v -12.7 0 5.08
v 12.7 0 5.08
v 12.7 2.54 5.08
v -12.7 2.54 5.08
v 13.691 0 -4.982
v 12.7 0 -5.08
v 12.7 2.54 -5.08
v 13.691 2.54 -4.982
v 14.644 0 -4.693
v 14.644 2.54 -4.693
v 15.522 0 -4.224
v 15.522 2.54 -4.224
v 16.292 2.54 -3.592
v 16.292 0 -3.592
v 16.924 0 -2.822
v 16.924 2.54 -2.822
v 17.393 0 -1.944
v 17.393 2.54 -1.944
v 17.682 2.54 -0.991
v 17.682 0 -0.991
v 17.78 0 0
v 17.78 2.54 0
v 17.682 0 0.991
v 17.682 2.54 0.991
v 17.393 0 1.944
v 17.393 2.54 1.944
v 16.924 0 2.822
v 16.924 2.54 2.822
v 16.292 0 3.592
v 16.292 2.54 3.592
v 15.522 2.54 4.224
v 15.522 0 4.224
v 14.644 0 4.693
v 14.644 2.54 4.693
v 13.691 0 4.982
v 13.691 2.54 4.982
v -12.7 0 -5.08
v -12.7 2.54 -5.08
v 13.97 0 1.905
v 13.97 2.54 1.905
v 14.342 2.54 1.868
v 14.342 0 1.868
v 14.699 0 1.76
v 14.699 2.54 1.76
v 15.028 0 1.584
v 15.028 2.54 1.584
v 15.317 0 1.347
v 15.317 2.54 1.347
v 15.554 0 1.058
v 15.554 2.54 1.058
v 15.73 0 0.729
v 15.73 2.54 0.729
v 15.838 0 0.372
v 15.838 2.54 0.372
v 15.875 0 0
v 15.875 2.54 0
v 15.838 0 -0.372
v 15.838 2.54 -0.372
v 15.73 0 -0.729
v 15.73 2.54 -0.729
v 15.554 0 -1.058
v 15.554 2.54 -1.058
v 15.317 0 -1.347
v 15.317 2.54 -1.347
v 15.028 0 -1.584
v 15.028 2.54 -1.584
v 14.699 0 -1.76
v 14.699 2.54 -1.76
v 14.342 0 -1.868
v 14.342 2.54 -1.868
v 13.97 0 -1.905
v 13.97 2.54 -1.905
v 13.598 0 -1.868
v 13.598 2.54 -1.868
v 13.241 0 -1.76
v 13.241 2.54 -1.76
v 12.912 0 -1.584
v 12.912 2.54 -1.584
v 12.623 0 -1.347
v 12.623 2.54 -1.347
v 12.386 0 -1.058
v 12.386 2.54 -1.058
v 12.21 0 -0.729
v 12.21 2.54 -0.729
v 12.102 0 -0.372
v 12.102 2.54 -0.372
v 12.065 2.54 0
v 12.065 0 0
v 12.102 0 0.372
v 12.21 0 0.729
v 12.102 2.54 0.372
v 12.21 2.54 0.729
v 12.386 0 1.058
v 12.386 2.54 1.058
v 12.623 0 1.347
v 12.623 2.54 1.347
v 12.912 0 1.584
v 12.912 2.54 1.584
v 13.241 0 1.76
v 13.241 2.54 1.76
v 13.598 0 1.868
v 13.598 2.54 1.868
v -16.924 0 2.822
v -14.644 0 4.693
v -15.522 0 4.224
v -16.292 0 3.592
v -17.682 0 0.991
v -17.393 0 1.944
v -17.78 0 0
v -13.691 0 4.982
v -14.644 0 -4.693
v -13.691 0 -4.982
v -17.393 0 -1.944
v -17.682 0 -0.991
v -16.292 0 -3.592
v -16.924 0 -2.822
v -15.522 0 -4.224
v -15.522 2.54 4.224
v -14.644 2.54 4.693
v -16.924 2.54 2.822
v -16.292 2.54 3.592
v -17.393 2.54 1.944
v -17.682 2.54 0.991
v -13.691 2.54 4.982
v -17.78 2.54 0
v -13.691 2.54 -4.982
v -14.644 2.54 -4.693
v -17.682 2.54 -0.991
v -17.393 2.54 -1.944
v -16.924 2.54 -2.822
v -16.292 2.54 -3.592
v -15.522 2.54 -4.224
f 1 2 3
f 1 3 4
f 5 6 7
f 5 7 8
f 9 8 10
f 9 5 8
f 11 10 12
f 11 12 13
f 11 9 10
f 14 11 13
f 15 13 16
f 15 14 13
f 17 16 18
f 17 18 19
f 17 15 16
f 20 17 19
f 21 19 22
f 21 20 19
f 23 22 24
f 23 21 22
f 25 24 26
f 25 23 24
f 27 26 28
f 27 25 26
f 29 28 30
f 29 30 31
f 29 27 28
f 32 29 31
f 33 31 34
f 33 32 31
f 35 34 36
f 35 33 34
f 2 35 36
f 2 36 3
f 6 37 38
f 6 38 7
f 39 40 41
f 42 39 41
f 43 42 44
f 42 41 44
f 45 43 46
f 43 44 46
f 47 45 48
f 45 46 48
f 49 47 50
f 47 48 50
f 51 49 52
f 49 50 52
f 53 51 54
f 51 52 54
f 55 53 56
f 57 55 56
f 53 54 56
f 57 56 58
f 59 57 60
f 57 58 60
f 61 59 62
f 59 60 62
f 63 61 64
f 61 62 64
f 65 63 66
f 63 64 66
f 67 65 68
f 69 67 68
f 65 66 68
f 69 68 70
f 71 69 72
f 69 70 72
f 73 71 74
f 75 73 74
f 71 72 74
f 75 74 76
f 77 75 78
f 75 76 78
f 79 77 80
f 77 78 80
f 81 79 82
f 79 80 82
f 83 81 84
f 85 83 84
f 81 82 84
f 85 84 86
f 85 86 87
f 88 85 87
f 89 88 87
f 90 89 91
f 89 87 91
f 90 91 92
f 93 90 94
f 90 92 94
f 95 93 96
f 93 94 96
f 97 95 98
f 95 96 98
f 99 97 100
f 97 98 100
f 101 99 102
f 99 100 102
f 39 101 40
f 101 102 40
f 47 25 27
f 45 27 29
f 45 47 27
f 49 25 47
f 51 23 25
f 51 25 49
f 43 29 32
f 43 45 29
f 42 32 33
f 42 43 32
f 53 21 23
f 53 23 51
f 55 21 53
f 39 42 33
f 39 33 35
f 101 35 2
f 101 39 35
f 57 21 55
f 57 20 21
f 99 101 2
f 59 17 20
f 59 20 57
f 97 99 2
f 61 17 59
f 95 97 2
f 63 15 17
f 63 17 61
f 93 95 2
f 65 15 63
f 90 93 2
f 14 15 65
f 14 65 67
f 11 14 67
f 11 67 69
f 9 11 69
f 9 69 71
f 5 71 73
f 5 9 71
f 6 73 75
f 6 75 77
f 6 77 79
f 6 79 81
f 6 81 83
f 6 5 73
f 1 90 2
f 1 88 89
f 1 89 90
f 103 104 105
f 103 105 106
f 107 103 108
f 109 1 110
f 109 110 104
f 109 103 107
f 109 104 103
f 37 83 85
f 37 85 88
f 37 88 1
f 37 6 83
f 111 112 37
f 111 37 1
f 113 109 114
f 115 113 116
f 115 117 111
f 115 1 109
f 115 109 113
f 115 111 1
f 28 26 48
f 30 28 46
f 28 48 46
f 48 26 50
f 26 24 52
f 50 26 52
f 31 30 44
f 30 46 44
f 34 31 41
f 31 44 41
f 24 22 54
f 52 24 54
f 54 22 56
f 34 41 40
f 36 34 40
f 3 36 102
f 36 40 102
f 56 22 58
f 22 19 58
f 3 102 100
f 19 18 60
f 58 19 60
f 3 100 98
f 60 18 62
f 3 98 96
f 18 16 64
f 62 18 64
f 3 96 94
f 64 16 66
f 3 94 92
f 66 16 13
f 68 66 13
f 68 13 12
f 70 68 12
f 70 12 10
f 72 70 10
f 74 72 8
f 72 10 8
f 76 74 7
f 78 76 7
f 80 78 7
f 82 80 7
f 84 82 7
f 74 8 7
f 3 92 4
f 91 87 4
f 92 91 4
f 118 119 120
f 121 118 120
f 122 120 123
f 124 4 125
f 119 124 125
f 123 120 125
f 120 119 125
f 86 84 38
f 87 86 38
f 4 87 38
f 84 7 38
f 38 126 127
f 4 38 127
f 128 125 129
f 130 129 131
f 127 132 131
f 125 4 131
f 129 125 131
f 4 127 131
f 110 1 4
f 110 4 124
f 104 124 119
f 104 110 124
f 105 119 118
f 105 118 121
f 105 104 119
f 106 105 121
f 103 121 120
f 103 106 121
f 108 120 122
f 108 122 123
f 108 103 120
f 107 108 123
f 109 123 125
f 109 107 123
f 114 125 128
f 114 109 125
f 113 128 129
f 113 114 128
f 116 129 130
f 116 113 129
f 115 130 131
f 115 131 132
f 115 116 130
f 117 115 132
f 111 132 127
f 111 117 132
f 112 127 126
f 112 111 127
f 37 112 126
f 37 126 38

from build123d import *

# Parameters (mm, degrees)
BATON_DEPTH       = 2.54
SKETCH5_R         = 1.905
JOINER_HOLE_DEPTH = 2.54


with BuildPart() as part:
    # Sketch1 → baton (new body)
    with BuildSketch(Plane(origin=(0, 0, 0), x_dir=(1, 0, 0), z_dir=(0, 1, 0))):
        with BuildLine():
            Line((-12.7, 5.08), (12.7, 5.08))
            ThreePointArc((12.7, 5.08), (17.78, 0), (12.7, -5.08))
            Line((12.7, -5.08), (-12.7, -5.08))
            ThreePointArc((-12.7, -5.08), (-17.78, 0), (-12.7, 5.08))
        make_face()
    extrude(amount=BATON_DEPTH)

    # Sketch5 → joiner hole (cut)
    with BuildSketch(Plane(origin=(0, 2.54, 0), x_dir=(1, 0, 0), z_dir=(0, 1, 0))):
        with Locations(Location((13.97, 0, 0), (0, 0, 270))):
            Circle(SKETCH5_R)
    extrude(amount=-JOINER_HOLE_DEPTH, mode=Mode.SUBTRACT)


solid = part.part
